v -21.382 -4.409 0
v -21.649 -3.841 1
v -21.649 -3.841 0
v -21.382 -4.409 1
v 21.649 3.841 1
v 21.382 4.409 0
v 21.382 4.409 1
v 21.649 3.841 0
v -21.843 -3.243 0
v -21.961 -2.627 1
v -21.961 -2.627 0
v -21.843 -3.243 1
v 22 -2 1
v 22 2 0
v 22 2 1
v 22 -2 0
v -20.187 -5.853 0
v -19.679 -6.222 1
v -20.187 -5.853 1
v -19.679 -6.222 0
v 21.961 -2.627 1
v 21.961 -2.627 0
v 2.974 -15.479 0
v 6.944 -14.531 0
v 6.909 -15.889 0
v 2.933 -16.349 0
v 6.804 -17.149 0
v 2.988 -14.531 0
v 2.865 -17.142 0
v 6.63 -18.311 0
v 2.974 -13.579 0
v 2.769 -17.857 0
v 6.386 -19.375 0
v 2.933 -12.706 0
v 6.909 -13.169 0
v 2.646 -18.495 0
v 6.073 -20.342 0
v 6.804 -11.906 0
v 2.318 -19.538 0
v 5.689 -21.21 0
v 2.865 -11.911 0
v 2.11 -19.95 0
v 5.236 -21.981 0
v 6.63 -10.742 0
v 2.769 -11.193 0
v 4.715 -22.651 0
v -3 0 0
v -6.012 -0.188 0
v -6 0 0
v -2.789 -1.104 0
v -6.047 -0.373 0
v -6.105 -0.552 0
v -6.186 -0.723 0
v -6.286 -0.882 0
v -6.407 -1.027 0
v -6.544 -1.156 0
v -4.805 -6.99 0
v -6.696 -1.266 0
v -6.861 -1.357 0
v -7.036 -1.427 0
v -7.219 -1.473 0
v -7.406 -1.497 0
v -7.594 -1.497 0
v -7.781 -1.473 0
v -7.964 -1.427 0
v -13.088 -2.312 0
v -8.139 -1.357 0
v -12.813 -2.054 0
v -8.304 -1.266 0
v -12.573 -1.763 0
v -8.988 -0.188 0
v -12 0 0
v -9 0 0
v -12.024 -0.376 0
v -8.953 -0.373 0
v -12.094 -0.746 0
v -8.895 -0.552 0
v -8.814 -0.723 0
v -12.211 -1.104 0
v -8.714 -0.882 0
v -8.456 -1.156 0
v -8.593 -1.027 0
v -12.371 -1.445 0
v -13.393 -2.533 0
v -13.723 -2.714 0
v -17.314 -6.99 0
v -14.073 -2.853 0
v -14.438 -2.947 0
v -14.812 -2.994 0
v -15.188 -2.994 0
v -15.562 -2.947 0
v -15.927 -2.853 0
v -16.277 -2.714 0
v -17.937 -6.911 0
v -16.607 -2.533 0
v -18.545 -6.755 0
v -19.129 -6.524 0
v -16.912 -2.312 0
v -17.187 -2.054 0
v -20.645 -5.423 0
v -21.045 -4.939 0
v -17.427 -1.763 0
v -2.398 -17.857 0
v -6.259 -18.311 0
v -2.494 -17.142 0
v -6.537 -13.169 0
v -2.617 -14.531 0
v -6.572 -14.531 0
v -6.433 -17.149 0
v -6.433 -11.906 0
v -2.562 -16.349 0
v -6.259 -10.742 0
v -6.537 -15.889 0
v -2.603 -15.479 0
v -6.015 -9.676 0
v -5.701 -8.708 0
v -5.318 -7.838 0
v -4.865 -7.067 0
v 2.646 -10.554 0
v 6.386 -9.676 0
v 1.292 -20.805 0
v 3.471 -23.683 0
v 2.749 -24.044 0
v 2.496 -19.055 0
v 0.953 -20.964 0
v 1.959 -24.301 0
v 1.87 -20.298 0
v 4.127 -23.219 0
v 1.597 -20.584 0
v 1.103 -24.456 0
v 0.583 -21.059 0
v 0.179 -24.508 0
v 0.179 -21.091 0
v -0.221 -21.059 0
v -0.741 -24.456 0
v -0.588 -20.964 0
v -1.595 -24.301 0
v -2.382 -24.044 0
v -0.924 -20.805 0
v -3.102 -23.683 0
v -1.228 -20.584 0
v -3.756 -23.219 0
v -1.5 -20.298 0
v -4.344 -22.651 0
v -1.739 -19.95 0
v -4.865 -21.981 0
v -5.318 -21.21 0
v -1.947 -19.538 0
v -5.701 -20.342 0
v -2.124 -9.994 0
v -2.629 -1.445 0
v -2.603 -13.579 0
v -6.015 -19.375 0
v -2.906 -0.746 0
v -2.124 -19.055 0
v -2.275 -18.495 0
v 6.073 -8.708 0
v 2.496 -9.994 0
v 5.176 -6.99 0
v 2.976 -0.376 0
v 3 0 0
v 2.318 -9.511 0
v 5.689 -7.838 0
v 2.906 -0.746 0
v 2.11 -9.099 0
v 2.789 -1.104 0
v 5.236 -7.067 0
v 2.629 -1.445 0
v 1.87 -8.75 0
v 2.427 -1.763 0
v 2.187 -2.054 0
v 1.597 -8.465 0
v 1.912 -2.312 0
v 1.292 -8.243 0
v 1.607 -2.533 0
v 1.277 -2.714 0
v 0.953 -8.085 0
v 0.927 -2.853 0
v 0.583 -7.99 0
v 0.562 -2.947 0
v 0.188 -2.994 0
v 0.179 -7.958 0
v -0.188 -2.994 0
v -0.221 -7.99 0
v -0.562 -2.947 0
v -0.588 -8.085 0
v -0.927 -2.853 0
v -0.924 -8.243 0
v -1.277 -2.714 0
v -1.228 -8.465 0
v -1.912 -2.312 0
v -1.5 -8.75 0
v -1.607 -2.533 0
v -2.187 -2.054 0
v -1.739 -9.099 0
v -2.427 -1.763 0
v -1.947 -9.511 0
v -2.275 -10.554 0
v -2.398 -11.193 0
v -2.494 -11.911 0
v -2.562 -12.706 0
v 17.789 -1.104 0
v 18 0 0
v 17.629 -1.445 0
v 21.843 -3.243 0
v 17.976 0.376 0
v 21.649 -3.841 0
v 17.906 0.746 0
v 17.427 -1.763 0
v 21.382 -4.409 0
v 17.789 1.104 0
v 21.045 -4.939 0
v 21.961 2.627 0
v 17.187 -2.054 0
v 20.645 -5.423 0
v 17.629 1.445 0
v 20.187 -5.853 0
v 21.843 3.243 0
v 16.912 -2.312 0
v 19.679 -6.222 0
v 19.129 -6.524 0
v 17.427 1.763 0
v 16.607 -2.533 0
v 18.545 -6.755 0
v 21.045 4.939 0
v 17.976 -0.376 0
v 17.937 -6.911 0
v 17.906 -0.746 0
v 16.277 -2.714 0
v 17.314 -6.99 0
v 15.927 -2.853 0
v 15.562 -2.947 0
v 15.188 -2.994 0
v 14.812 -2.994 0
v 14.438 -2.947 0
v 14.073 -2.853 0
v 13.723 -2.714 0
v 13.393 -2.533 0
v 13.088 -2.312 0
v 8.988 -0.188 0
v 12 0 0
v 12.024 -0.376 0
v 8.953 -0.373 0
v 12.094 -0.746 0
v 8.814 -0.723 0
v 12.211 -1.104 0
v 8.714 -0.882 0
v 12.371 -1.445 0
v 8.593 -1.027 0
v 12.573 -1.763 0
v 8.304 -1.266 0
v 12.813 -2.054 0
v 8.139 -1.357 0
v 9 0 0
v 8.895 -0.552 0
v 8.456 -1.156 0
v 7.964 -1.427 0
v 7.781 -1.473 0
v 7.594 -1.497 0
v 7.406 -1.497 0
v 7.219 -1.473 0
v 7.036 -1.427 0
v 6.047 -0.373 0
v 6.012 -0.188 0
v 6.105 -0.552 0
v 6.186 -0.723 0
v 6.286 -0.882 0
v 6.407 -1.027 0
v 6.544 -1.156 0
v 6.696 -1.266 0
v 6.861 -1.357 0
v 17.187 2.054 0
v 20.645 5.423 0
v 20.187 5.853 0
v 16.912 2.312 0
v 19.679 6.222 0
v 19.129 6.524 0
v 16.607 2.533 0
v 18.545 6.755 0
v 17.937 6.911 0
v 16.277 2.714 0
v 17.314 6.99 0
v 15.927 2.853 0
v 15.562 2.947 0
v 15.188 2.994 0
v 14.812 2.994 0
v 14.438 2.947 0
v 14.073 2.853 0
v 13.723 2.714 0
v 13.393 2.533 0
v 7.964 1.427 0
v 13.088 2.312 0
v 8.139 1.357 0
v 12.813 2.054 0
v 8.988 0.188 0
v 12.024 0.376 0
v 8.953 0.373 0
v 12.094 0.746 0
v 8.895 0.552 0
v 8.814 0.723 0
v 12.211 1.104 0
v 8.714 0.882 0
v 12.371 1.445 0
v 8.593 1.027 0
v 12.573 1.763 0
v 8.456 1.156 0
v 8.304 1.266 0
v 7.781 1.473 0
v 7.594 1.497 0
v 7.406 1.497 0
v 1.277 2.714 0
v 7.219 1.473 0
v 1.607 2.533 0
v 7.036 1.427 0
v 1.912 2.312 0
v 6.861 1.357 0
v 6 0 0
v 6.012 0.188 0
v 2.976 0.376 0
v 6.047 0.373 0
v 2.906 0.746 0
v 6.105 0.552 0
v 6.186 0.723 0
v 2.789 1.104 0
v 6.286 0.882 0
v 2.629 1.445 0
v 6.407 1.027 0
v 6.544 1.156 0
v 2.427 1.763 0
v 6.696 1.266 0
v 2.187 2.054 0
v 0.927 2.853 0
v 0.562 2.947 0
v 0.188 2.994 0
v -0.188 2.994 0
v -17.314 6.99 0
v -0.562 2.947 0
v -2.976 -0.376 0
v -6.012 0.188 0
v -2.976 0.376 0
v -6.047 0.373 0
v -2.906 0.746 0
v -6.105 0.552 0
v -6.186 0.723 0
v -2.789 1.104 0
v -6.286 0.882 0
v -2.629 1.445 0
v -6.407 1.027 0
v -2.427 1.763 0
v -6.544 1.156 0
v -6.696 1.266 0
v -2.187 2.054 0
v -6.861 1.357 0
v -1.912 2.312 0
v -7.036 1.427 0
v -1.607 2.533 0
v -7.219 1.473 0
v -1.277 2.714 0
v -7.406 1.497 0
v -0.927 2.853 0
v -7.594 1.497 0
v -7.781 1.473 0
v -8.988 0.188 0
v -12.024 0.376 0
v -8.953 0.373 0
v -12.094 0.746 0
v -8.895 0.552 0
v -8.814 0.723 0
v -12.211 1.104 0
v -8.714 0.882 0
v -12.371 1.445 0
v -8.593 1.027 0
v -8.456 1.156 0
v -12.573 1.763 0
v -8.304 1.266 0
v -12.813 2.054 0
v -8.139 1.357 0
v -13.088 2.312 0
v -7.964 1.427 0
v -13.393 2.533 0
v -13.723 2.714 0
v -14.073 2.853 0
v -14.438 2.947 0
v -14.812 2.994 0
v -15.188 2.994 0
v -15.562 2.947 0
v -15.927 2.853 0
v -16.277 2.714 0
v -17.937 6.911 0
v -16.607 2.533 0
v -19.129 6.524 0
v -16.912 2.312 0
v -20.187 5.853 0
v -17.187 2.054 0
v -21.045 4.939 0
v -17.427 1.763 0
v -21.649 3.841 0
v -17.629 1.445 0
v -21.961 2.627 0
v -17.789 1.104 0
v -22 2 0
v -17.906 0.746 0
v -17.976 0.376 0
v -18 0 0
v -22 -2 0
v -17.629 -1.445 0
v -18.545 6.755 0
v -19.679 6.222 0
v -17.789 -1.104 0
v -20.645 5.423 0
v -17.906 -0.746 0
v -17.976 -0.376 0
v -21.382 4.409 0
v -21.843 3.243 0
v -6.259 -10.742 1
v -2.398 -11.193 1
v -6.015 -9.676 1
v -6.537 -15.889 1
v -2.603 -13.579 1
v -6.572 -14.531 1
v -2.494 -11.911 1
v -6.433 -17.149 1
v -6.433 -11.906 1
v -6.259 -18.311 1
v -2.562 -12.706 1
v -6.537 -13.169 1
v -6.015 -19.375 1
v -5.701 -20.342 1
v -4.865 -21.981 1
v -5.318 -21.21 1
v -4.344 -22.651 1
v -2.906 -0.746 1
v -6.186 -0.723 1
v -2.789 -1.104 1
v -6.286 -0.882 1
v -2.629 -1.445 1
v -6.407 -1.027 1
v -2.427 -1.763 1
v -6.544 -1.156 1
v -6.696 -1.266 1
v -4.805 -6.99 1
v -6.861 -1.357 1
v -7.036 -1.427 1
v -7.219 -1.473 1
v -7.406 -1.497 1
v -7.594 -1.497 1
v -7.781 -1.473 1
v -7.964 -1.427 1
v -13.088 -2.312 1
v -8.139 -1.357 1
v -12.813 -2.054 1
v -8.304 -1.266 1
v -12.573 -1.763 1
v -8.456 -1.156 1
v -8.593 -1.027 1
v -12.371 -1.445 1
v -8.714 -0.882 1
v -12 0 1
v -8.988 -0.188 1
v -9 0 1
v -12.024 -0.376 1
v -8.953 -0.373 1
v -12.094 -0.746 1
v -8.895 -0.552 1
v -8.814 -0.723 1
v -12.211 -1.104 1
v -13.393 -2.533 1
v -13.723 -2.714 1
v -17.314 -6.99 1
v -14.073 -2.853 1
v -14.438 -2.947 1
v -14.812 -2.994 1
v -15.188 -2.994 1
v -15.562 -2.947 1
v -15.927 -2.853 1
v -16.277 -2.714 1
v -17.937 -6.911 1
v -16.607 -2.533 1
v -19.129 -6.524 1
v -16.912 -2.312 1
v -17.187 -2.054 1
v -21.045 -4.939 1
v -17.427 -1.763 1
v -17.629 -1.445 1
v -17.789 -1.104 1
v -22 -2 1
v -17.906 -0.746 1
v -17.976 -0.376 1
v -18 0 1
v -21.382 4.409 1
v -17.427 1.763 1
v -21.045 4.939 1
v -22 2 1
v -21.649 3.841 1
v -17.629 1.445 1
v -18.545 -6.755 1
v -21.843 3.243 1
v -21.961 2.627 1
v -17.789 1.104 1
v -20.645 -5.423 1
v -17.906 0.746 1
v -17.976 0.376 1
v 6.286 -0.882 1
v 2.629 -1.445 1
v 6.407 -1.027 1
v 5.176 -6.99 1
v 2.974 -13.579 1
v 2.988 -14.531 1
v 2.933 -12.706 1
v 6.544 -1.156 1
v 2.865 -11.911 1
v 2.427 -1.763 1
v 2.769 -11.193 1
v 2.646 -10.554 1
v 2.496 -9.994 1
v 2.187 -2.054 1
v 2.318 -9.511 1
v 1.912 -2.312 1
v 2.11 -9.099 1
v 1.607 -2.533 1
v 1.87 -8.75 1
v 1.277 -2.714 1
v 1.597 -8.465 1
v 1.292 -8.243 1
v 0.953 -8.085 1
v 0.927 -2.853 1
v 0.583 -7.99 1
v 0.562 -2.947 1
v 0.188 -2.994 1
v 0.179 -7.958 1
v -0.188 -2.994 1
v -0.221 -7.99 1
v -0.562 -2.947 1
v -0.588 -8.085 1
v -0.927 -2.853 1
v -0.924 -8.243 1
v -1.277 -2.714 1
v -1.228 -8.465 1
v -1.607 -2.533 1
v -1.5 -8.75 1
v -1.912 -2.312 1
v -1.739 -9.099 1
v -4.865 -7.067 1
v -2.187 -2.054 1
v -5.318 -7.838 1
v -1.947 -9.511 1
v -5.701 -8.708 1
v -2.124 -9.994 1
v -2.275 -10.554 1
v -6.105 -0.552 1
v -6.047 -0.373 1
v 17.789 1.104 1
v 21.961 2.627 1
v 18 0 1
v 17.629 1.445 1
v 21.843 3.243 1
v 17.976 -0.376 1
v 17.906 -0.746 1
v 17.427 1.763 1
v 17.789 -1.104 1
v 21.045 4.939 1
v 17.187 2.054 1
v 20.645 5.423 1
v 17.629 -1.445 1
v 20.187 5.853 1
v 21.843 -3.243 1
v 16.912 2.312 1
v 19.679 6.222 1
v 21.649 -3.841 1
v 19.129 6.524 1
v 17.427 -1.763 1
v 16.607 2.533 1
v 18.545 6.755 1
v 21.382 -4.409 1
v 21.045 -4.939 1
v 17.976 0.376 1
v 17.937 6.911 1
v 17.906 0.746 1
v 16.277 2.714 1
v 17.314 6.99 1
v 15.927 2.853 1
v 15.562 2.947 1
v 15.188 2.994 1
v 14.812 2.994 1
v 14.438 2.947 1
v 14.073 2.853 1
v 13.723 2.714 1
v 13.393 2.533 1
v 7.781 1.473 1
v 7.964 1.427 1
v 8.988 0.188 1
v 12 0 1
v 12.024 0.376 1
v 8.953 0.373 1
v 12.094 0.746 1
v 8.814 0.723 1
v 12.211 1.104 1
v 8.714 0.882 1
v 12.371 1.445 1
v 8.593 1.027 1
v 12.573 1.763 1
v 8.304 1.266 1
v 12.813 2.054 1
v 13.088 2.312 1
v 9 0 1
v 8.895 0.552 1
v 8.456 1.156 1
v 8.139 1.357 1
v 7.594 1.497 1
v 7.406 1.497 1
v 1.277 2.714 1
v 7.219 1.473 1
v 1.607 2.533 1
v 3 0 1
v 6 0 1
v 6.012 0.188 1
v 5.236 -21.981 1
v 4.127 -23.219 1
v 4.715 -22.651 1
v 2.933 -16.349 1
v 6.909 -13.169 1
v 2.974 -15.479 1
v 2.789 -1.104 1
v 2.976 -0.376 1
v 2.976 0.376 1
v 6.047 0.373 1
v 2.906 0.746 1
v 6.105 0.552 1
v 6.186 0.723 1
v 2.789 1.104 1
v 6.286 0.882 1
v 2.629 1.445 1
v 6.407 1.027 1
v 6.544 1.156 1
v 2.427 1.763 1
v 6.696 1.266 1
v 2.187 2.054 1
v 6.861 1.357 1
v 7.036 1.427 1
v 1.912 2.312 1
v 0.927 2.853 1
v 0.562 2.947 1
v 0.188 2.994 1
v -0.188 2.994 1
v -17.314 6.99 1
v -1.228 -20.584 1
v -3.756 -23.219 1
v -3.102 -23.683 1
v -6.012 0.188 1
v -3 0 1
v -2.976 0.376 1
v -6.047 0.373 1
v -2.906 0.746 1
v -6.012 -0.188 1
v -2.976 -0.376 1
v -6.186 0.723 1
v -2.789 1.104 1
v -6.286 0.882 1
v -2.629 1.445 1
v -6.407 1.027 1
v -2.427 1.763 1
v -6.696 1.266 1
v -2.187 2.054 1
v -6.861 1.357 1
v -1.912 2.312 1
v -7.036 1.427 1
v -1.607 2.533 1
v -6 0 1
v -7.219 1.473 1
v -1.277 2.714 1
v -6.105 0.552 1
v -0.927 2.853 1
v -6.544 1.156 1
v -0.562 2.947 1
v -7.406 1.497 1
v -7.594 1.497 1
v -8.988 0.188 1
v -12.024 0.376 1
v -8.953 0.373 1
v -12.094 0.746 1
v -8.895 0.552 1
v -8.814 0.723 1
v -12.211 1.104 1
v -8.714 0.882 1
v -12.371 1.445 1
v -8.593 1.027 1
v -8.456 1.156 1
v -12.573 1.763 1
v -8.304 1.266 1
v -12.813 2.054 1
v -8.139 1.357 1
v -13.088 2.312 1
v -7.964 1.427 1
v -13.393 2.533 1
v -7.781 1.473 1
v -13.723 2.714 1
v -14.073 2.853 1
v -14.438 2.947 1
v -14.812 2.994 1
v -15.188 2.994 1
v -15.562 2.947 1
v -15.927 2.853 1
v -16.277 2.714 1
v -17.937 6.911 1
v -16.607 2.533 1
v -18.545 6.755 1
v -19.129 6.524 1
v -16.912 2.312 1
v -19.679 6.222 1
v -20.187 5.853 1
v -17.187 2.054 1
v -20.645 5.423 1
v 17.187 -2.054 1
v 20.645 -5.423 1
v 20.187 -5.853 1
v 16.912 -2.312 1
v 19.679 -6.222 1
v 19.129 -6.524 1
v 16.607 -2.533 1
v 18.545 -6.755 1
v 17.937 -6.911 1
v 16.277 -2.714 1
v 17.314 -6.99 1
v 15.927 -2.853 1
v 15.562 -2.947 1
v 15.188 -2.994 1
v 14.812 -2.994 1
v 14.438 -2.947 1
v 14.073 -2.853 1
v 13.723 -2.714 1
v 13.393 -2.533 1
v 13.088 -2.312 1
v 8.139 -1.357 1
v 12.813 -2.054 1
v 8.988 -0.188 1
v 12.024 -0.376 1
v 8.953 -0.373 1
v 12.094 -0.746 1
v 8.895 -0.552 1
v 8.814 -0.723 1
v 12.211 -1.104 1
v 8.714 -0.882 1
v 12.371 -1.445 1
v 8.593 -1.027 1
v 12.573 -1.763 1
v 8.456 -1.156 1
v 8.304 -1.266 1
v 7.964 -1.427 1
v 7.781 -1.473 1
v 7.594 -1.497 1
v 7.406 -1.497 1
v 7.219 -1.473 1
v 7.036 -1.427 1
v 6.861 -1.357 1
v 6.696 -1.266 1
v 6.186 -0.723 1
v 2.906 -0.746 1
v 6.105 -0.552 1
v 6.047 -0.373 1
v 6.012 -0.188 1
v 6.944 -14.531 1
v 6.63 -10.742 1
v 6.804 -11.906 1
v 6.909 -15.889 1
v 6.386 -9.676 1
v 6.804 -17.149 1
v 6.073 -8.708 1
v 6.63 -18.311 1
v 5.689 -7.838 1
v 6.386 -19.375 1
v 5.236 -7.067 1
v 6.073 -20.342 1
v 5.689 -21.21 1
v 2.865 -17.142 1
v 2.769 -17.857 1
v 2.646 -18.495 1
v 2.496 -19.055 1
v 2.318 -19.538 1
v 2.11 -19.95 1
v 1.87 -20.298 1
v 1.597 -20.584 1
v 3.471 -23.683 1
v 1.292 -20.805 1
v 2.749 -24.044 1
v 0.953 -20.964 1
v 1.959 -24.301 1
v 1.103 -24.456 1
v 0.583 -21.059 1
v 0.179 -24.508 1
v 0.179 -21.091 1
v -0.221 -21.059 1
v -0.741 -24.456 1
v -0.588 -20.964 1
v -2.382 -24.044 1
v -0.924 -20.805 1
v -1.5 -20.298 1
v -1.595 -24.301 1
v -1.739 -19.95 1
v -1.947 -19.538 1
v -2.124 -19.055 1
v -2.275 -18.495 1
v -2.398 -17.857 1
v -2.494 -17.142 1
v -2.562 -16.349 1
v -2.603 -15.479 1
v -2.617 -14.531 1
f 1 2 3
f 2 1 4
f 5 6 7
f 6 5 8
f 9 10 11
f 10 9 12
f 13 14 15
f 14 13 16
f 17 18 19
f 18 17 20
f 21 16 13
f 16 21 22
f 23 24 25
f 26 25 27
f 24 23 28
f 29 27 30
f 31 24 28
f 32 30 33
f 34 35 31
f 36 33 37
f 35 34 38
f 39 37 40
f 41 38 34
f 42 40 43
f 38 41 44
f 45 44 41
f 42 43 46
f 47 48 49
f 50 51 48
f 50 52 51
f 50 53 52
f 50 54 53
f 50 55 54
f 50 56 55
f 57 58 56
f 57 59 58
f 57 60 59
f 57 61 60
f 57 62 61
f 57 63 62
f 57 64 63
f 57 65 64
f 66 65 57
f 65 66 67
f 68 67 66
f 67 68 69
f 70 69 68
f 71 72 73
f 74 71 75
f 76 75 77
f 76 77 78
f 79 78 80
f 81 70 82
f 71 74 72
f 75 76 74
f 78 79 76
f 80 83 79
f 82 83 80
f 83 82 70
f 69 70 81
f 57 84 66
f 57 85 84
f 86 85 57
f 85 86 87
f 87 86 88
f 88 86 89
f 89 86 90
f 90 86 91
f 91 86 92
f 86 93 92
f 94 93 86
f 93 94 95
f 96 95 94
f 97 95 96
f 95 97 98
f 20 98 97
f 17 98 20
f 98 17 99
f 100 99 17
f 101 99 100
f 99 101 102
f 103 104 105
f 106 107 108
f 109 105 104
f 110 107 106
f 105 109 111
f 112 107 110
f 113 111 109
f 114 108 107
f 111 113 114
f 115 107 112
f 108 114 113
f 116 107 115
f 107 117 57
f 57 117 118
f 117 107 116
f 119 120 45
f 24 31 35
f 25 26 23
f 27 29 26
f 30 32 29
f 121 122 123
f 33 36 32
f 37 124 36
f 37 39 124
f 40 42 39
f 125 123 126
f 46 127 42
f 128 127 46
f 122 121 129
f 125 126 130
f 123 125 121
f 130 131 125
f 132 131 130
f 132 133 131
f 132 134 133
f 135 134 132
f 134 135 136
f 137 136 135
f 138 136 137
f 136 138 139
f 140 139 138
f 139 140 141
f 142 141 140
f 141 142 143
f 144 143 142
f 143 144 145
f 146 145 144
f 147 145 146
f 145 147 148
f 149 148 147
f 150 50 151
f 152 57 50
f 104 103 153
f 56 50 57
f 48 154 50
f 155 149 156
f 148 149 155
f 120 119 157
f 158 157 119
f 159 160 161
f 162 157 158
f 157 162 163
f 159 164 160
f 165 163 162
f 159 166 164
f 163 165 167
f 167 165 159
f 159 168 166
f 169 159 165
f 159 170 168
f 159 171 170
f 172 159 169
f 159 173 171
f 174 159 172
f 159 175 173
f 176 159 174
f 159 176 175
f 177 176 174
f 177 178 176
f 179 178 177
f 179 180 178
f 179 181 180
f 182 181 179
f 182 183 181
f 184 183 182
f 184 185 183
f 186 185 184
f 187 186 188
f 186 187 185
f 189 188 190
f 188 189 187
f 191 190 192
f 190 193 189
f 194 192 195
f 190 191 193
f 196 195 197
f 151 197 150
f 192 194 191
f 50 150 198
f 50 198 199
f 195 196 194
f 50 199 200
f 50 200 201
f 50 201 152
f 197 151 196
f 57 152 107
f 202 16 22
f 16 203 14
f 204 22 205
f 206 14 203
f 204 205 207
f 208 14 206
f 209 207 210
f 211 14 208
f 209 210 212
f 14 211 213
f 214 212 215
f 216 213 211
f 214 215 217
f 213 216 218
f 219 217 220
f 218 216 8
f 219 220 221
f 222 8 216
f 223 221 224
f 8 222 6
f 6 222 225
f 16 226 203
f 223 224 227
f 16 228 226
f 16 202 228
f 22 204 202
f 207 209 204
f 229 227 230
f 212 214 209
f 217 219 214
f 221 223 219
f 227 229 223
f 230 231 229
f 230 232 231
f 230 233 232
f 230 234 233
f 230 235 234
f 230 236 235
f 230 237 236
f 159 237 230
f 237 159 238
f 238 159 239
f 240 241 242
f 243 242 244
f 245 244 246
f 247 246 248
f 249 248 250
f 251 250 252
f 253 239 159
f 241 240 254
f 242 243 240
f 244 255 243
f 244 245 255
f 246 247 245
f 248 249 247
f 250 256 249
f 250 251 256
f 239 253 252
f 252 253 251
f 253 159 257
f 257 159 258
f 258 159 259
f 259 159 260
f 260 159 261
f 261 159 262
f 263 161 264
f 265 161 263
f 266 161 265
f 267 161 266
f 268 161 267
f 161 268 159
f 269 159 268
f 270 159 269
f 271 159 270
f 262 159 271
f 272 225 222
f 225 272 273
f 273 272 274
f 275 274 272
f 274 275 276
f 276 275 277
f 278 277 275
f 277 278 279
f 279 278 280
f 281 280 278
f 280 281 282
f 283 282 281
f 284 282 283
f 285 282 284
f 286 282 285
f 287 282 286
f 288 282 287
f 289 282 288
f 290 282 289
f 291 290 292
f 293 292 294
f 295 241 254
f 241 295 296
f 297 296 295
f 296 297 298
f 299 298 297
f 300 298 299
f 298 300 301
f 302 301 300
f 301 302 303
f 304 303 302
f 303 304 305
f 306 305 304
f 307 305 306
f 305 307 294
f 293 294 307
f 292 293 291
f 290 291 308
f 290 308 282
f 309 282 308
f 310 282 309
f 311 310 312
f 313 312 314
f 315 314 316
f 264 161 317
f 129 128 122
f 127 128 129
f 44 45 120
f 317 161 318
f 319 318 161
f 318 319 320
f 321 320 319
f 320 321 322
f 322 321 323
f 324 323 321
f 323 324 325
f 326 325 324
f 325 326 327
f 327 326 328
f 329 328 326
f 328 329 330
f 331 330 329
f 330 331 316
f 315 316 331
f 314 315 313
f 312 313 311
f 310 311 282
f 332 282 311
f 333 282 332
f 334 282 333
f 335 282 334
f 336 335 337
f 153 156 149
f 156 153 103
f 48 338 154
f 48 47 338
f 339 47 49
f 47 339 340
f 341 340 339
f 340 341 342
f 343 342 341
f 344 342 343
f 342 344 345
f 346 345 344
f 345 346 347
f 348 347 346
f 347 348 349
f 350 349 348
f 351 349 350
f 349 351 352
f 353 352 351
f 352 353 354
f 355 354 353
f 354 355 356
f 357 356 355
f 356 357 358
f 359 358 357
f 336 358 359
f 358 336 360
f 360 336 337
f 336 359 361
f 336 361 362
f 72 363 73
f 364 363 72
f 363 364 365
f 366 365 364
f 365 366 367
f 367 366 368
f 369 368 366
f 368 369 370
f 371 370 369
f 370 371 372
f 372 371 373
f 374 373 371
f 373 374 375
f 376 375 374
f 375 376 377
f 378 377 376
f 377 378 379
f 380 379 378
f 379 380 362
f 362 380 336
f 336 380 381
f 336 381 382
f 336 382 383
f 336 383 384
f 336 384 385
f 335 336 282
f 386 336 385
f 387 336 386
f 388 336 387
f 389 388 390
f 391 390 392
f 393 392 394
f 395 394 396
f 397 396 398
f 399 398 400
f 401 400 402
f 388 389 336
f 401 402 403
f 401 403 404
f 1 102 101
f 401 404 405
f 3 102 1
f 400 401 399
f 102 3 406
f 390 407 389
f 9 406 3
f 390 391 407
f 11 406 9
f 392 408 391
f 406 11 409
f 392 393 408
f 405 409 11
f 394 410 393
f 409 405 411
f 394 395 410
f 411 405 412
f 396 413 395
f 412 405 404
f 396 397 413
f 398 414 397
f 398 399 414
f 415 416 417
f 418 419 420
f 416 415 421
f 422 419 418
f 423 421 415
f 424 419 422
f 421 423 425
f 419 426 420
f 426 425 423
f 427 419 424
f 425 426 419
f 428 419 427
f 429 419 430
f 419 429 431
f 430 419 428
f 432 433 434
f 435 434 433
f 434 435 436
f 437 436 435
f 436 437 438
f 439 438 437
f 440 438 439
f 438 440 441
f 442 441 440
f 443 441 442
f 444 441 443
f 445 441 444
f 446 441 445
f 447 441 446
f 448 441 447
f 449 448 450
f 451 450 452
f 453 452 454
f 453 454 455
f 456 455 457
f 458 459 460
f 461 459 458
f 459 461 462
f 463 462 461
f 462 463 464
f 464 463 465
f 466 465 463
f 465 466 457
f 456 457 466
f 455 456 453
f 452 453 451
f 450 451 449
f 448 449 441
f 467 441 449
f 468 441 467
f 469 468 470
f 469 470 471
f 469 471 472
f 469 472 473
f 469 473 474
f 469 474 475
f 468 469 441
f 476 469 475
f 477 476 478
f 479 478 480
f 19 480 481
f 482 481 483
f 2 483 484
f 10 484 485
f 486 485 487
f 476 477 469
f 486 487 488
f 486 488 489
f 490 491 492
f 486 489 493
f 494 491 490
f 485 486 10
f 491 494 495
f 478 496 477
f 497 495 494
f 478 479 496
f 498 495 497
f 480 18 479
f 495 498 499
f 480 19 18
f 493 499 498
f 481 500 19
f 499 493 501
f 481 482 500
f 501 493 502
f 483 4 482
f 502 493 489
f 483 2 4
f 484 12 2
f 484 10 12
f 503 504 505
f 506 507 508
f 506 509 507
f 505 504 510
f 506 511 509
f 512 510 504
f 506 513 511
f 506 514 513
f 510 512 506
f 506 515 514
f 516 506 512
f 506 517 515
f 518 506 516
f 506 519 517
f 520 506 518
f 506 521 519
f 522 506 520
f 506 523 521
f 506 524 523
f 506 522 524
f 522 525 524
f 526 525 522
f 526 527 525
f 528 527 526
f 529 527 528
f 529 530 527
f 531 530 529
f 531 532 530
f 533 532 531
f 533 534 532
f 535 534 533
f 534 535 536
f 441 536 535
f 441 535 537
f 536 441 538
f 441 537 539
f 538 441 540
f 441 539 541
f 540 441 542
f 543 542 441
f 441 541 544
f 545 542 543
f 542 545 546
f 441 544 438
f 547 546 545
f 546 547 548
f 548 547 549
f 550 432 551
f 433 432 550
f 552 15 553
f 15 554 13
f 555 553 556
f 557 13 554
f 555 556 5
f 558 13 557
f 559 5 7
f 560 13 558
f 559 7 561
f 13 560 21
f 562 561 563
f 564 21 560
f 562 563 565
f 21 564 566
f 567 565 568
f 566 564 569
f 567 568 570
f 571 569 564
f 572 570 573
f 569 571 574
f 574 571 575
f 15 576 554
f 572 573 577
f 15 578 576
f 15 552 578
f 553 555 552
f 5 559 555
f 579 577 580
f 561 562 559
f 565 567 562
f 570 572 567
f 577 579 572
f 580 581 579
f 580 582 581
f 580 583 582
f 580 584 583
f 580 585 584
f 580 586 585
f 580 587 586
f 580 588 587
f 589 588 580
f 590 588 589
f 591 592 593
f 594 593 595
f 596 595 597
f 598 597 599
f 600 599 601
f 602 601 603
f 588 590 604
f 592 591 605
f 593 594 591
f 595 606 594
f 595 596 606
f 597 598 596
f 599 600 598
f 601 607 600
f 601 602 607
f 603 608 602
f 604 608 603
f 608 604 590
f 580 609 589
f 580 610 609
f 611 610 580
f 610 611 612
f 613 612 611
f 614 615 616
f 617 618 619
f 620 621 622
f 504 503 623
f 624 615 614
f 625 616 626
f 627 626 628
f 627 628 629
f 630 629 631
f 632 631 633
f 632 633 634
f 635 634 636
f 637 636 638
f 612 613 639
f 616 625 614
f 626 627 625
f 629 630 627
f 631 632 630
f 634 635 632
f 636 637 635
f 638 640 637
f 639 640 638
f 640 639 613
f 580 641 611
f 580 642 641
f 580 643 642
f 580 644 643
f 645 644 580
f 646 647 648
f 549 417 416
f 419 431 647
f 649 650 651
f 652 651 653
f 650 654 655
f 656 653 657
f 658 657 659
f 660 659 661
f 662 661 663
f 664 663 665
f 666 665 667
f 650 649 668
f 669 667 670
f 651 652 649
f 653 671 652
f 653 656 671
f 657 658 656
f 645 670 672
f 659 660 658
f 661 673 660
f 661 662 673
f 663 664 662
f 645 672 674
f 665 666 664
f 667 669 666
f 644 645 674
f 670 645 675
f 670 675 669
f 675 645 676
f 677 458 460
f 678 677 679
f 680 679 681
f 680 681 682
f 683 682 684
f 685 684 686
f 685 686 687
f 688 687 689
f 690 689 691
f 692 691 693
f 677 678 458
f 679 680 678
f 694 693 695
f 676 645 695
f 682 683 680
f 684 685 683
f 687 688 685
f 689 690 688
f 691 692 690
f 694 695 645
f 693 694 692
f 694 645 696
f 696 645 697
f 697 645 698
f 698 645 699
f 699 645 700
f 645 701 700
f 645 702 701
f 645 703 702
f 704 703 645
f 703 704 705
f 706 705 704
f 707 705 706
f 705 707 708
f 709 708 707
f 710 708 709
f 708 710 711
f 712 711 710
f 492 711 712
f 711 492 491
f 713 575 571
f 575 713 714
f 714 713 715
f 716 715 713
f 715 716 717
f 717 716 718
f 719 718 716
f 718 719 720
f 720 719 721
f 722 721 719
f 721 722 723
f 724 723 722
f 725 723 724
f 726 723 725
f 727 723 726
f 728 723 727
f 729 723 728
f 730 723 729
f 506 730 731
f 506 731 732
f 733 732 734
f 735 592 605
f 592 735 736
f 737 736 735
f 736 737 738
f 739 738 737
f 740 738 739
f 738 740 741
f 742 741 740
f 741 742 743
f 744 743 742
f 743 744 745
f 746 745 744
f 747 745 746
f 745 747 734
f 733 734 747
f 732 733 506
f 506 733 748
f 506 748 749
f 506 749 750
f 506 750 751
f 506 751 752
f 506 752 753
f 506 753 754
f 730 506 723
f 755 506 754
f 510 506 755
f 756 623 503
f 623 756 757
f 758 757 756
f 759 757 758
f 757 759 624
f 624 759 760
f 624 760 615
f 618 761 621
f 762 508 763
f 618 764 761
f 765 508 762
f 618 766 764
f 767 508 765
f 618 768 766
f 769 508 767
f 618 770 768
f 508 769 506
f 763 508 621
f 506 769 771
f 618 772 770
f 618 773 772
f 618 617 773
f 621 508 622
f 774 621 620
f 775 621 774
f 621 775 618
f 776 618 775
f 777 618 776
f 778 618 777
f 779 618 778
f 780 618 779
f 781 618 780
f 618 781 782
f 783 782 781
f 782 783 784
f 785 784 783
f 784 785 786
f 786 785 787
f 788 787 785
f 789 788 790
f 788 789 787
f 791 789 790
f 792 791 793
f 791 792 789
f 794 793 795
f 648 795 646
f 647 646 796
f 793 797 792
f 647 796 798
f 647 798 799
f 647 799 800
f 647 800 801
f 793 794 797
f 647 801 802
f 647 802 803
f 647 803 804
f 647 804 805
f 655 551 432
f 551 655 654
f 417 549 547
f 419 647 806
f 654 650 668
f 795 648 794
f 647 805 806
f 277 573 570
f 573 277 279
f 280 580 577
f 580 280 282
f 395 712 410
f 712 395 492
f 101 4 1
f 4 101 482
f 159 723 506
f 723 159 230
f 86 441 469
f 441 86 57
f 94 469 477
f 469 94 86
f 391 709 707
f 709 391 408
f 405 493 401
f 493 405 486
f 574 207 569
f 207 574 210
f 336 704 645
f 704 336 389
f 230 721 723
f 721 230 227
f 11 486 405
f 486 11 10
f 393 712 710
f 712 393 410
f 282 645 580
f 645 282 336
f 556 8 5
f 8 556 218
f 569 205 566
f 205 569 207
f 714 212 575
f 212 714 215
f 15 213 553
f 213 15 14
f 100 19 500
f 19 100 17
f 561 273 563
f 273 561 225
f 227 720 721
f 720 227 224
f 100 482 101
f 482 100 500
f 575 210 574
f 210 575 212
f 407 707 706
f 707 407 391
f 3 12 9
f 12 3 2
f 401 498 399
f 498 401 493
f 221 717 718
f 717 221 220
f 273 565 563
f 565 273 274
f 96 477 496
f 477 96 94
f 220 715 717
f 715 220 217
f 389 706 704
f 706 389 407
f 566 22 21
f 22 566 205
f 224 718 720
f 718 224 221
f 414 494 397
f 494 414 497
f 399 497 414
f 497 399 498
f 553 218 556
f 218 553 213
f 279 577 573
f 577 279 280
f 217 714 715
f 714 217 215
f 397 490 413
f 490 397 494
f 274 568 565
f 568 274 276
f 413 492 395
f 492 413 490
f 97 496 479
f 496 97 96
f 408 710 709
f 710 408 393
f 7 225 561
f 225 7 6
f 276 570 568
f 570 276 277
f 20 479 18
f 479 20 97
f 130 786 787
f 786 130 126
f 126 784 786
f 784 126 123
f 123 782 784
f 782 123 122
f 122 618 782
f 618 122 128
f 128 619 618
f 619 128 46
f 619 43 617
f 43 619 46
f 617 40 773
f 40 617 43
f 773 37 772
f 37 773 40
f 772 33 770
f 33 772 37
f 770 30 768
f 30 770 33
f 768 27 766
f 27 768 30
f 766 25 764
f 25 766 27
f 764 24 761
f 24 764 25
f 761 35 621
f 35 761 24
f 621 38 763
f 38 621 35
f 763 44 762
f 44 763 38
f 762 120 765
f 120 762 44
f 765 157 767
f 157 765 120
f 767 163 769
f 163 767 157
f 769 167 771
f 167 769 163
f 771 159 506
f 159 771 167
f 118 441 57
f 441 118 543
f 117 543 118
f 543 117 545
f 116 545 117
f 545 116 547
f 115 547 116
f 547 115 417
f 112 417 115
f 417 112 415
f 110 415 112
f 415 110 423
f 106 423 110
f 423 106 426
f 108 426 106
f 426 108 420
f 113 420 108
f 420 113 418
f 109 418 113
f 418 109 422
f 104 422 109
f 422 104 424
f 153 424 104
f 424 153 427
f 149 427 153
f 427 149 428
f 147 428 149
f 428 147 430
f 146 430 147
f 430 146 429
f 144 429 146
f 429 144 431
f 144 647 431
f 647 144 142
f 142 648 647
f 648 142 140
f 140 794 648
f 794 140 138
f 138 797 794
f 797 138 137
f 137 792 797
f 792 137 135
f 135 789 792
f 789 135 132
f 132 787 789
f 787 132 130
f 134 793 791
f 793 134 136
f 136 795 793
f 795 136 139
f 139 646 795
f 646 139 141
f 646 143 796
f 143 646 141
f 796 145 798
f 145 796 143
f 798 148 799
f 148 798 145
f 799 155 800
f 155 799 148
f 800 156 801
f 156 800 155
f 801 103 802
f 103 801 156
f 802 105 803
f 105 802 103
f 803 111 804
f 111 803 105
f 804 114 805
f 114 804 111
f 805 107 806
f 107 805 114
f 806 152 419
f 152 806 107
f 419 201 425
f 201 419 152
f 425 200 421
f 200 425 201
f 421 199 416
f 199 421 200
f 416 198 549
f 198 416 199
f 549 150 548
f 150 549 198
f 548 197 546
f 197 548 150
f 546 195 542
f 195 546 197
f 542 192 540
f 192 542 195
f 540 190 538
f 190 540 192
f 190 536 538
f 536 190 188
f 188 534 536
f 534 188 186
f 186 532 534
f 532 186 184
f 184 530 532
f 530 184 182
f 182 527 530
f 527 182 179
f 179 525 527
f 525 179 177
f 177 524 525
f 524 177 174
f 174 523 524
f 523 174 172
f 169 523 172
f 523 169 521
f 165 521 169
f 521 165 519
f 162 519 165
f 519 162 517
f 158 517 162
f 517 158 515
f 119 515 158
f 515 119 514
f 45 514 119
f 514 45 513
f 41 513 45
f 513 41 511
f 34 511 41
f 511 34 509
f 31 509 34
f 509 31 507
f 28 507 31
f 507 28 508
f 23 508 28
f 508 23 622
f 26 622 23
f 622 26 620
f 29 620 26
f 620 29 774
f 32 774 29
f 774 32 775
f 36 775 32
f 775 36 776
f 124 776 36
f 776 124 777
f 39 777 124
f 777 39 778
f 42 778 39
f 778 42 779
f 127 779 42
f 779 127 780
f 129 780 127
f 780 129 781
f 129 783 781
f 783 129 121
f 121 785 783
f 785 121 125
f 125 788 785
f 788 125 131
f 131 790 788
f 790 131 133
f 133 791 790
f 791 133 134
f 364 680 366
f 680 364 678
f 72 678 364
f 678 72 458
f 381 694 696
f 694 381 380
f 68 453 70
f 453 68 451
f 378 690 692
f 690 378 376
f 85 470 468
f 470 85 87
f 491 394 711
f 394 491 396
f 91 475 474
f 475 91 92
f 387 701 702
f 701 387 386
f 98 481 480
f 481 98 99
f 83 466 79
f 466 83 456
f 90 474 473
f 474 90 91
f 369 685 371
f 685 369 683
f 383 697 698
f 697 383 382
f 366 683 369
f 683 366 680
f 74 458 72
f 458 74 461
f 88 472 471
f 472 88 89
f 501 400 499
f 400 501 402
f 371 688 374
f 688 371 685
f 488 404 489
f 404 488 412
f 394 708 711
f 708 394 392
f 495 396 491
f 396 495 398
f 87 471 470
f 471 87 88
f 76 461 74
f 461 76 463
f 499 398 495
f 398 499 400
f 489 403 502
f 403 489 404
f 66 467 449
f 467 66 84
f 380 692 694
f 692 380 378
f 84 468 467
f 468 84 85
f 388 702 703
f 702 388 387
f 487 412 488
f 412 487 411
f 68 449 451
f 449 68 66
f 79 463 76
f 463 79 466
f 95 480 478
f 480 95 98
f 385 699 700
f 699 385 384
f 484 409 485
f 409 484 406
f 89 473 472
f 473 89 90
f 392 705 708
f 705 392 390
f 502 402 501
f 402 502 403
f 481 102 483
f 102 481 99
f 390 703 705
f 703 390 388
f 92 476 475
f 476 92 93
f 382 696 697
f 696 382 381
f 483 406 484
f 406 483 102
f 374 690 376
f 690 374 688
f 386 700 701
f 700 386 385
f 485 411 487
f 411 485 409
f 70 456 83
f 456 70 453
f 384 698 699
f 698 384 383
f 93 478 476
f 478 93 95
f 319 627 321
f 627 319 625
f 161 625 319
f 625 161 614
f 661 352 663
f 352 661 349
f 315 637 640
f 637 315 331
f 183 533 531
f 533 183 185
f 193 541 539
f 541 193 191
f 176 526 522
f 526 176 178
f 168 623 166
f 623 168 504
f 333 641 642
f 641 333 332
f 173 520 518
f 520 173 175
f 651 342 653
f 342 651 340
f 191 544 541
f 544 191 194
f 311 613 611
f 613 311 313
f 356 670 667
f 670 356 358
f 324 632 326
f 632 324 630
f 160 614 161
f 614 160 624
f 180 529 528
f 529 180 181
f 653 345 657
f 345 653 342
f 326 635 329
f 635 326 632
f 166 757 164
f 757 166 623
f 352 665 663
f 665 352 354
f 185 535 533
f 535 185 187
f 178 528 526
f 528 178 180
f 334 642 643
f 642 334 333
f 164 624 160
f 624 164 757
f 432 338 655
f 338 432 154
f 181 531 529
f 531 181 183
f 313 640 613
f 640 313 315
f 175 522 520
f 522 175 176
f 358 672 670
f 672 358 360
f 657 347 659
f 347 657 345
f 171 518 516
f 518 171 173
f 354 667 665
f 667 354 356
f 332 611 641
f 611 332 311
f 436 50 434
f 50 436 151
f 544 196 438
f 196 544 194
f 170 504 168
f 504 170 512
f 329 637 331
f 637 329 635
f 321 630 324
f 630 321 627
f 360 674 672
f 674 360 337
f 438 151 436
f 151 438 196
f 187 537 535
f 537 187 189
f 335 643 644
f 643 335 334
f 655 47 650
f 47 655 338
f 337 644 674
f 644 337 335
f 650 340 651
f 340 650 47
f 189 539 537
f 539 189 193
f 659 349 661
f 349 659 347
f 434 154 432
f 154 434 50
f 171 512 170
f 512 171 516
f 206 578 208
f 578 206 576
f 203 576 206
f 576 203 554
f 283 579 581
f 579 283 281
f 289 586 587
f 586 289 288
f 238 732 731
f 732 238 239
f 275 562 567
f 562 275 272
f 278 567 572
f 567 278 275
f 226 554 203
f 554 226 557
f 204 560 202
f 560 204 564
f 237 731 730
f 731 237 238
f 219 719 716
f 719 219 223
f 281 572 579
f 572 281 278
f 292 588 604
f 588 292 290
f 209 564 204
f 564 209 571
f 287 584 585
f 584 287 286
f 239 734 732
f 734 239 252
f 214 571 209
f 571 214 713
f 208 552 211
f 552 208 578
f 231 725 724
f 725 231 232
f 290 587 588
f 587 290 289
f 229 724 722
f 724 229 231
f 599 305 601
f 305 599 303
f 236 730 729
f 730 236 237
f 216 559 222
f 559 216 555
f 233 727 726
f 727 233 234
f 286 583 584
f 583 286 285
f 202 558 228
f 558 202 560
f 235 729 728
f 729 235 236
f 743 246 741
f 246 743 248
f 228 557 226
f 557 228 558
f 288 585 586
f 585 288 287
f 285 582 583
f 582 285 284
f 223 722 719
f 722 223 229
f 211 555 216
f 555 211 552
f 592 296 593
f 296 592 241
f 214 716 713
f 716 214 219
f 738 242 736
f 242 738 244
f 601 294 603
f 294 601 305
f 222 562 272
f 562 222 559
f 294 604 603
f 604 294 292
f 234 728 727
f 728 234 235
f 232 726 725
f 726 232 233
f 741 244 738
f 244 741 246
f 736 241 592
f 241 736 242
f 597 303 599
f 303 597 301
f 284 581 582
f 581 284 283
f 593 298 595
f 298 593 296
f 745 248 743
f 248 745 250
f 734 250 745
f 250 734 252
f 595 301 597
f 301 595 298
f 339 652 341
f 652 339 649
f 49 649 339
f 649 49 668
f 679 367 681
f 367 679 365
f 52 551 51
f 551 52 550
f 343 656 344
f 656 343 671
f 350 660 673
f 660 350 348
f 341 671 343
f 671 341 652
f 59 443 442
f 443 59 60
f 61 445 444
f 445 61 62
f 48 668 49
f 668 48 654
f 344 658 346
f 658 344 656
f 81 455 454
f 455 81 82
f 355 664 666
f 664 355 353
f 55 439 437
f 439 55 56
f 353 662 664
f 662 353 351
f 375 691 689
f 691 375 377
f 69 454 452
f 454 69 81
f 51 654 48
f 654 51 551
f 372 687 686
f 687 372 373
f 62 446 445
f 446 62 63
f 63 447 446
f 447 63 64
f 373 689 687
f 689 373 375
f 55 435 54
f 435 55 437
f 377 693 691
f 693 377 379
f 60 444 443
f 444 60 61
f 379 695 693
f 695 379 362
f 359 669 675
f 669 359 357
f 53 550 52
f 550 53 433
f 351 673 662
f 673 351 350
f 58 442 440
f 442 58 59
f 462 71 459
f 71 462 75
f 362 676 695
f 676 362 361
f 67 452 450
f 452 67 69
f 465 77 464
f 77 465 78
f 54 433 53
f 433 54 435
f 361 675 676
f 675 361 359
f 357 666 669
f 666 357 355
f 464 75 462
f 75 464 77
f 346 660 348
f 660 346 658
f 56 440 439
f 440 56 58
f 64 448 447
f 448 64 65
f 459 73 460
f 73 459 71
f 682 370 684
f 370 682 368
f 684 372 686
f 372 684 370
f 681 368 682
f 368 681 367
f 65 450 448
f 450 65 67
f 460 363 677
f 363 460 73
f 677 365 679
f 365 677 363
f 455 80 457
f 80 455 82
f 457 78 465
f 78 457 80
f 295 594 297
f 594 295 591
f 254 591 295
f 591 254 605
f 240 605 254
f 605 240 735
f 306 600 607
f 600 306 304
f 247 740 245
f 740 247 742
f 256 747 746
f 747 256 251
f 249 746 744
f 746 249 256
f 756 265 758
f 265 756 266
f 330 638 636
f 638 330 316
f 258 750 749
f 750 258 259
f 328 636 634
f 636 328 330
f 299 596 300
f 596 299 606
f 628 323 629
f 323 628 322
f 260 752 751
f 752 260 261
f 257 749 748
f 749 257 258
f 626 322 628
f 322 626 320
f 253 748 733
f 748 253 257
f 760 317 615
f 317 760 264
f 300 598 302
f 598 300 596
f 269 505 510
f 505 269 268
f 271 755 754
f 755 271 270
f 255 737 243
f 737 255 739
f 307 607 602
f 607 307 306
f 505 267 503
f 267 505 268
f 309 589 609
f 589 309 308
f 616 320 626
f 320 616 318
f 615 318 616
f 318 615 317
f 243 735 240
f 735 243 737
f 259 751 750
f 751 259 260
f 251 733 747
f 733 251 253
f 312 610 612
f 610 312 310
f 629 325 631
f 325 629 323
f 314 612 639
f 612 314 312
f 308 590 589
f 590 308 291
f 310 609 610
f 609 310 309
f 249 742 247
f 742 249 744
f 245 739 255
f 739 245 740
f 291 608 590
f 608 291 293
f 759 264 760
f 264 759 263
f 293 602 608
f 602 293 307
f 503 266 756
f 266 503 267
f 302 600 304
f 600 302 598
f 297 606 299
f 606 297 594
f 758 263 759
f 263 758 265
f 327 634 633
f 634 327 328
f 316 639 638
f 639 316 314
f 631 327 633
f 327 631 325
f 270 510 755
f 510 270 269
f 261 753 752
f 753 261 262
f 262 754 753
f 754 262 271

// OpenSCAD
$fn = 50;


difference() {
	union() {
		*color(alpha = 1.0000000000, c = "gray") {
			translate(v = [0, 14, 0]) {
				linear_extrude(height = 1) {
					text(font = "Arial:style=Bold", halign = "center", size = 4.5000000000, text = "COMMENT description oobb_plate_shape_p_type_1_depth_3_width_1_thickness_o_extra_oobb_size", valign = "center");
				}
			}
		}
		hull() {
			translate(v = [-17.0000000000, 2.0000000000, 0]) {
				cylinder(h = 1, r = 5);
			}
			translate(v = [17.0000000000, 2.0000000000, 0]) {
				cylinder(h = 1, r = 5);
			}
			translate(v = [-17.0000000000, -2.0000000000, 0]) {
				cylinder(h = 1, r = 5);
			}
			translate(v = [17.0000000000, -2.0000000000, 0]) {
				cylinder(h = 1, r = 5);
			}
		}
		translate(v = [0, -5, 0]) {
			linear_extrude(height = 1) {
				text(font = "DejaVu Sans Mono:style=Bold", halign = "center", size = 19.0000000000, text = "O", valign = "top");
			}
		}
	}
	union() {
		*color(alpha = 1.0000000000, c = "gray") {
			translate(v = [0, 14, 0]) {
				linear_extrude(height = 1) {
					text(font = "Arial:style=Bold", halign = "center", size = 4.5000000000, text = "COMMENT description oobb_holes_shape_n_type_3_width_1_thickness_o_extra_oobb_size_1_height_'all'_holes_true_both_holes", valign = "center");
				}
			}
		}
		translate(v = [-15.0000000000, 0.0000000000, 0]) {
			translate(v = [0, 0, -50]) {
				cylinder(h = 100, r = 3.0000000000);
			}
		}
		translate(v = [0, 0, -50]) {
			cylinder(h = 100, r = 3.0000000000);
		}
		translate(v = [15.0000000000, 0.0000000000, 0]) {
			translate(v = [0, 0, -50]) {
				cylinder(h = 100, r = 3.0000000000);
			}
		}
		translate(v = [-15.0000000000, 0.0000000000, 0]) {
			translate(v = [0, 0, -50]) {
				cylinder(h = 100, r = 1.5000000000);
			}
		}
		translate(v = [-7.5000000000, 0.0000000000, 0]) {
			translate(v = [0, 0, -50]) {
				cylinder(h = 100, r = 1.5000000000);
			}
		}
		translate(v = [0, 0, -50]) {
			cylinder(h = 100, r = 1.5000000000);
		}
		translate(v = [7.5000000000, 0.0000000000, 0]) {
			translate(v = [0, 0, -50]) {
				cylinder(h = 100, r = 1.5000000000);
			}
		}
		translate(v = [15.0000000000, 0.0000000000, 0]) {
			translate(v = [0, 0, -50]) {
				cylinder(h = 100, r = 1.5000000000);
			}
		}
	}
}
